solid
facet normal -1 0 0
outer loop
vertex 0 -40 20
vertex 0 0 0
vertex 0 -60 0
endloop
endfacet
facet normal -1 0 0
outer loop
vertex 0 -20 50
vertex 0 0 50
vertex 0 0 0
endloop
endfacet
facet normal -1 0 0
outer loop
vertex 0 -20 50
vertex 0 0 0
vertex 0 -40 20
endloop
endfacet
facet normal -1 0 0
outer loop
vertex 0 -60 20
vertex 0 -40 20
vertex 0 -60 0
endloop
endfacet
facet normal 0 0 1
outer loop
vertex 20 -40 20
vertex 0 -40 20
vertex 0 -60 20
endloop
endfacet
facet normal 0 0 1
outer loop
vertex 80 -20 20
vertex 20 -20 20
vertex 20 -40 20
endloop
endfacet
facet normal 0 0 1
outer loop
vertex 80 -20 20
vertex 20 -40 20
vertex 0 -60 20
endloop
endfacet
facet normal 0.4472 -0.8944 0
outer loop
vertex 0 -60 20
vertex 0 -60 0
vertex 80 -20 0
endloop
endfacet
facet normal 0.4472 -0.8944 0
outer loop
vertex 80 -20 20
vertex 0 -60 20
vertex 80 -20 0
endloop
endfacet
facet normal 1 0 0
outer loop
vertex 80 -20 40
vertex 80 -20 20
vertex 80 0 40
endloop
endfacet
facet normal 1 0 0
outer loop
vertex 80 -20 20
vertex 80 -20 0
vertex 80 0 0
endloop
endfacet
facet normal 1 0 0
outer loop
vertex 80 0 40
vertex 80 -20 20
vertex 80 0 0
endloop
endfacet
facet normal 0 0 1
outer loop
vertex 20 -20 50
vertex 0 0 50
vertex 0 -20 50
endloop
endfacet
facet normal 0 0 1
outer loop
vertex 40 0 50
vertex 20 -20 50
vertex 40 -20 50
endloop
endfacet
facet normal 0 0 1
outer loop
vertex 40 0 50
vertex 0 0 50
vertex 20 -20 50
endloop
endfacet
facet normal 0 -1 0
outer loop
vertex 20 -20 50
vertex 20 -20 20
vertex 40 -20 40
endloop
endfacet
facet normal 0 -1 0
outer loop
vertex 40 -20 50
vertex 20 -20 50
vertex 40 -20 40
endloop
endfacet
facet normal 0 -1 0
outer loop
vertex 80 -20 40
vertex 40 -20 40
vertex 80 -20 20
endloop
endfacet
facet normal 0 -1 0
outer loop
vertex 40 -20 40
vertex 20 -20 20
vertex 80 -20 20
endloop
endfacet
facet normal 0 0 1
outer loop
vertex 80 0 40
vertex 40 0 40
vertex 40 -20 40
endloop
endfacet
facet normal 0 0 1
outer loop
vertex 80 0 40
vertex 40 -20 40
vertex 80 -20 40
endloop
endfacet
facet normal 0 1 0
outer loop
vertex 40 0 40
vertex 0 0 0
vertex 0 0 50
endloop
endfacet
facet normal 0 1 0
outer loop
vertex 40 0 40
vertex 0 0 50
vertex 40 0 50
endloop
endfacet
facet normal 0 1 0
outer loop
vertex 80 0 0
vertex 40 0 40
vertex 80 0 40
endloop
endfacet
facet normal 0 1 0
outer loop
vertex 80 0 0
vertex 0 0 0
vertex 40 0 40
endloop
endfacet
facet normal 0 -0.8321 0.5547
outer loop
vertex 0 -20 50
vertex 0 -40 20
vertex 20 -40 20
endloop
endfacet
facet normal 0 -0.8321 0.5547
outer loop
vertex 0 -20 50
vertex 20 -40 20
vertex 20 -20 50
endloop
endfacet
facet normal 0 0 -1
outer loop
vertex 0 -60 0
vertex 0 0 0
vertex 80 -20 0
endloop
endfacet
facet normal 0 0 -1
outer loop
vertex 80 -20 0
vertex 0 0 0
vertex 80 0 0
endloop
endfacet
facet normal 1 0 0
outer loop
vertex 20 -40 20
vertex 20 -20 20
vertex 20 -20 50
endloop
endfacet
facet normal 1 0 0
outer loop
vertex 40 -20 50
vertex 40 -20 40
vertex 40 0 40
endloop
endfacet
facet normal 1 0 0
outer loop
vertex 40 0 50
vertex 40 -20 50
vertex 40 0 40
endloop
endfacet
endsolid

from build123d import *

# Parameters (mm, degrees)
F1_DEPTH = 20
F2_W     = 40
F2_H     = 20
F3_DEPTH = 30
F4_DEPTH = 20
F6_DEPTH = 20


with BuildPart() as f1:
    # F0 (on Top) → F1 (new body)
    with BuildSketch(Plane.XY):
        Polygon((80, 0), (0, 0), (0, -60), (80, -20), align=None)
    extrude(amount=F1_DEPTH)

    # F2 (on face) → F3 (join)
    with BuildSketch(Plane.XY.offset(20)):
        with Locations((20, -10)):
            Rectangle(F2_W, F2_H)
    extrude(amount=F3_DEPTH)

    # F2 (on face) → F4 (join)
    with BuildSketch(Plane.XY.offset(20)):
        with Locations((60, -10)):
            Rectangle(F2_W, F2_H)
    extrude(amount=F4_DEPTH)

    # F5 (on face) → F6 (join)
    with BuildSketch(Plane(origin=(0, 0, 0), x_dir=(0, -1, 0), z_dir=(-1, 0, 0))):
        Polygon((40, 20), (20, 50), (20, 20), align=None)
    extrude(amount=-F6_DEPTH)


solid = f1.part
